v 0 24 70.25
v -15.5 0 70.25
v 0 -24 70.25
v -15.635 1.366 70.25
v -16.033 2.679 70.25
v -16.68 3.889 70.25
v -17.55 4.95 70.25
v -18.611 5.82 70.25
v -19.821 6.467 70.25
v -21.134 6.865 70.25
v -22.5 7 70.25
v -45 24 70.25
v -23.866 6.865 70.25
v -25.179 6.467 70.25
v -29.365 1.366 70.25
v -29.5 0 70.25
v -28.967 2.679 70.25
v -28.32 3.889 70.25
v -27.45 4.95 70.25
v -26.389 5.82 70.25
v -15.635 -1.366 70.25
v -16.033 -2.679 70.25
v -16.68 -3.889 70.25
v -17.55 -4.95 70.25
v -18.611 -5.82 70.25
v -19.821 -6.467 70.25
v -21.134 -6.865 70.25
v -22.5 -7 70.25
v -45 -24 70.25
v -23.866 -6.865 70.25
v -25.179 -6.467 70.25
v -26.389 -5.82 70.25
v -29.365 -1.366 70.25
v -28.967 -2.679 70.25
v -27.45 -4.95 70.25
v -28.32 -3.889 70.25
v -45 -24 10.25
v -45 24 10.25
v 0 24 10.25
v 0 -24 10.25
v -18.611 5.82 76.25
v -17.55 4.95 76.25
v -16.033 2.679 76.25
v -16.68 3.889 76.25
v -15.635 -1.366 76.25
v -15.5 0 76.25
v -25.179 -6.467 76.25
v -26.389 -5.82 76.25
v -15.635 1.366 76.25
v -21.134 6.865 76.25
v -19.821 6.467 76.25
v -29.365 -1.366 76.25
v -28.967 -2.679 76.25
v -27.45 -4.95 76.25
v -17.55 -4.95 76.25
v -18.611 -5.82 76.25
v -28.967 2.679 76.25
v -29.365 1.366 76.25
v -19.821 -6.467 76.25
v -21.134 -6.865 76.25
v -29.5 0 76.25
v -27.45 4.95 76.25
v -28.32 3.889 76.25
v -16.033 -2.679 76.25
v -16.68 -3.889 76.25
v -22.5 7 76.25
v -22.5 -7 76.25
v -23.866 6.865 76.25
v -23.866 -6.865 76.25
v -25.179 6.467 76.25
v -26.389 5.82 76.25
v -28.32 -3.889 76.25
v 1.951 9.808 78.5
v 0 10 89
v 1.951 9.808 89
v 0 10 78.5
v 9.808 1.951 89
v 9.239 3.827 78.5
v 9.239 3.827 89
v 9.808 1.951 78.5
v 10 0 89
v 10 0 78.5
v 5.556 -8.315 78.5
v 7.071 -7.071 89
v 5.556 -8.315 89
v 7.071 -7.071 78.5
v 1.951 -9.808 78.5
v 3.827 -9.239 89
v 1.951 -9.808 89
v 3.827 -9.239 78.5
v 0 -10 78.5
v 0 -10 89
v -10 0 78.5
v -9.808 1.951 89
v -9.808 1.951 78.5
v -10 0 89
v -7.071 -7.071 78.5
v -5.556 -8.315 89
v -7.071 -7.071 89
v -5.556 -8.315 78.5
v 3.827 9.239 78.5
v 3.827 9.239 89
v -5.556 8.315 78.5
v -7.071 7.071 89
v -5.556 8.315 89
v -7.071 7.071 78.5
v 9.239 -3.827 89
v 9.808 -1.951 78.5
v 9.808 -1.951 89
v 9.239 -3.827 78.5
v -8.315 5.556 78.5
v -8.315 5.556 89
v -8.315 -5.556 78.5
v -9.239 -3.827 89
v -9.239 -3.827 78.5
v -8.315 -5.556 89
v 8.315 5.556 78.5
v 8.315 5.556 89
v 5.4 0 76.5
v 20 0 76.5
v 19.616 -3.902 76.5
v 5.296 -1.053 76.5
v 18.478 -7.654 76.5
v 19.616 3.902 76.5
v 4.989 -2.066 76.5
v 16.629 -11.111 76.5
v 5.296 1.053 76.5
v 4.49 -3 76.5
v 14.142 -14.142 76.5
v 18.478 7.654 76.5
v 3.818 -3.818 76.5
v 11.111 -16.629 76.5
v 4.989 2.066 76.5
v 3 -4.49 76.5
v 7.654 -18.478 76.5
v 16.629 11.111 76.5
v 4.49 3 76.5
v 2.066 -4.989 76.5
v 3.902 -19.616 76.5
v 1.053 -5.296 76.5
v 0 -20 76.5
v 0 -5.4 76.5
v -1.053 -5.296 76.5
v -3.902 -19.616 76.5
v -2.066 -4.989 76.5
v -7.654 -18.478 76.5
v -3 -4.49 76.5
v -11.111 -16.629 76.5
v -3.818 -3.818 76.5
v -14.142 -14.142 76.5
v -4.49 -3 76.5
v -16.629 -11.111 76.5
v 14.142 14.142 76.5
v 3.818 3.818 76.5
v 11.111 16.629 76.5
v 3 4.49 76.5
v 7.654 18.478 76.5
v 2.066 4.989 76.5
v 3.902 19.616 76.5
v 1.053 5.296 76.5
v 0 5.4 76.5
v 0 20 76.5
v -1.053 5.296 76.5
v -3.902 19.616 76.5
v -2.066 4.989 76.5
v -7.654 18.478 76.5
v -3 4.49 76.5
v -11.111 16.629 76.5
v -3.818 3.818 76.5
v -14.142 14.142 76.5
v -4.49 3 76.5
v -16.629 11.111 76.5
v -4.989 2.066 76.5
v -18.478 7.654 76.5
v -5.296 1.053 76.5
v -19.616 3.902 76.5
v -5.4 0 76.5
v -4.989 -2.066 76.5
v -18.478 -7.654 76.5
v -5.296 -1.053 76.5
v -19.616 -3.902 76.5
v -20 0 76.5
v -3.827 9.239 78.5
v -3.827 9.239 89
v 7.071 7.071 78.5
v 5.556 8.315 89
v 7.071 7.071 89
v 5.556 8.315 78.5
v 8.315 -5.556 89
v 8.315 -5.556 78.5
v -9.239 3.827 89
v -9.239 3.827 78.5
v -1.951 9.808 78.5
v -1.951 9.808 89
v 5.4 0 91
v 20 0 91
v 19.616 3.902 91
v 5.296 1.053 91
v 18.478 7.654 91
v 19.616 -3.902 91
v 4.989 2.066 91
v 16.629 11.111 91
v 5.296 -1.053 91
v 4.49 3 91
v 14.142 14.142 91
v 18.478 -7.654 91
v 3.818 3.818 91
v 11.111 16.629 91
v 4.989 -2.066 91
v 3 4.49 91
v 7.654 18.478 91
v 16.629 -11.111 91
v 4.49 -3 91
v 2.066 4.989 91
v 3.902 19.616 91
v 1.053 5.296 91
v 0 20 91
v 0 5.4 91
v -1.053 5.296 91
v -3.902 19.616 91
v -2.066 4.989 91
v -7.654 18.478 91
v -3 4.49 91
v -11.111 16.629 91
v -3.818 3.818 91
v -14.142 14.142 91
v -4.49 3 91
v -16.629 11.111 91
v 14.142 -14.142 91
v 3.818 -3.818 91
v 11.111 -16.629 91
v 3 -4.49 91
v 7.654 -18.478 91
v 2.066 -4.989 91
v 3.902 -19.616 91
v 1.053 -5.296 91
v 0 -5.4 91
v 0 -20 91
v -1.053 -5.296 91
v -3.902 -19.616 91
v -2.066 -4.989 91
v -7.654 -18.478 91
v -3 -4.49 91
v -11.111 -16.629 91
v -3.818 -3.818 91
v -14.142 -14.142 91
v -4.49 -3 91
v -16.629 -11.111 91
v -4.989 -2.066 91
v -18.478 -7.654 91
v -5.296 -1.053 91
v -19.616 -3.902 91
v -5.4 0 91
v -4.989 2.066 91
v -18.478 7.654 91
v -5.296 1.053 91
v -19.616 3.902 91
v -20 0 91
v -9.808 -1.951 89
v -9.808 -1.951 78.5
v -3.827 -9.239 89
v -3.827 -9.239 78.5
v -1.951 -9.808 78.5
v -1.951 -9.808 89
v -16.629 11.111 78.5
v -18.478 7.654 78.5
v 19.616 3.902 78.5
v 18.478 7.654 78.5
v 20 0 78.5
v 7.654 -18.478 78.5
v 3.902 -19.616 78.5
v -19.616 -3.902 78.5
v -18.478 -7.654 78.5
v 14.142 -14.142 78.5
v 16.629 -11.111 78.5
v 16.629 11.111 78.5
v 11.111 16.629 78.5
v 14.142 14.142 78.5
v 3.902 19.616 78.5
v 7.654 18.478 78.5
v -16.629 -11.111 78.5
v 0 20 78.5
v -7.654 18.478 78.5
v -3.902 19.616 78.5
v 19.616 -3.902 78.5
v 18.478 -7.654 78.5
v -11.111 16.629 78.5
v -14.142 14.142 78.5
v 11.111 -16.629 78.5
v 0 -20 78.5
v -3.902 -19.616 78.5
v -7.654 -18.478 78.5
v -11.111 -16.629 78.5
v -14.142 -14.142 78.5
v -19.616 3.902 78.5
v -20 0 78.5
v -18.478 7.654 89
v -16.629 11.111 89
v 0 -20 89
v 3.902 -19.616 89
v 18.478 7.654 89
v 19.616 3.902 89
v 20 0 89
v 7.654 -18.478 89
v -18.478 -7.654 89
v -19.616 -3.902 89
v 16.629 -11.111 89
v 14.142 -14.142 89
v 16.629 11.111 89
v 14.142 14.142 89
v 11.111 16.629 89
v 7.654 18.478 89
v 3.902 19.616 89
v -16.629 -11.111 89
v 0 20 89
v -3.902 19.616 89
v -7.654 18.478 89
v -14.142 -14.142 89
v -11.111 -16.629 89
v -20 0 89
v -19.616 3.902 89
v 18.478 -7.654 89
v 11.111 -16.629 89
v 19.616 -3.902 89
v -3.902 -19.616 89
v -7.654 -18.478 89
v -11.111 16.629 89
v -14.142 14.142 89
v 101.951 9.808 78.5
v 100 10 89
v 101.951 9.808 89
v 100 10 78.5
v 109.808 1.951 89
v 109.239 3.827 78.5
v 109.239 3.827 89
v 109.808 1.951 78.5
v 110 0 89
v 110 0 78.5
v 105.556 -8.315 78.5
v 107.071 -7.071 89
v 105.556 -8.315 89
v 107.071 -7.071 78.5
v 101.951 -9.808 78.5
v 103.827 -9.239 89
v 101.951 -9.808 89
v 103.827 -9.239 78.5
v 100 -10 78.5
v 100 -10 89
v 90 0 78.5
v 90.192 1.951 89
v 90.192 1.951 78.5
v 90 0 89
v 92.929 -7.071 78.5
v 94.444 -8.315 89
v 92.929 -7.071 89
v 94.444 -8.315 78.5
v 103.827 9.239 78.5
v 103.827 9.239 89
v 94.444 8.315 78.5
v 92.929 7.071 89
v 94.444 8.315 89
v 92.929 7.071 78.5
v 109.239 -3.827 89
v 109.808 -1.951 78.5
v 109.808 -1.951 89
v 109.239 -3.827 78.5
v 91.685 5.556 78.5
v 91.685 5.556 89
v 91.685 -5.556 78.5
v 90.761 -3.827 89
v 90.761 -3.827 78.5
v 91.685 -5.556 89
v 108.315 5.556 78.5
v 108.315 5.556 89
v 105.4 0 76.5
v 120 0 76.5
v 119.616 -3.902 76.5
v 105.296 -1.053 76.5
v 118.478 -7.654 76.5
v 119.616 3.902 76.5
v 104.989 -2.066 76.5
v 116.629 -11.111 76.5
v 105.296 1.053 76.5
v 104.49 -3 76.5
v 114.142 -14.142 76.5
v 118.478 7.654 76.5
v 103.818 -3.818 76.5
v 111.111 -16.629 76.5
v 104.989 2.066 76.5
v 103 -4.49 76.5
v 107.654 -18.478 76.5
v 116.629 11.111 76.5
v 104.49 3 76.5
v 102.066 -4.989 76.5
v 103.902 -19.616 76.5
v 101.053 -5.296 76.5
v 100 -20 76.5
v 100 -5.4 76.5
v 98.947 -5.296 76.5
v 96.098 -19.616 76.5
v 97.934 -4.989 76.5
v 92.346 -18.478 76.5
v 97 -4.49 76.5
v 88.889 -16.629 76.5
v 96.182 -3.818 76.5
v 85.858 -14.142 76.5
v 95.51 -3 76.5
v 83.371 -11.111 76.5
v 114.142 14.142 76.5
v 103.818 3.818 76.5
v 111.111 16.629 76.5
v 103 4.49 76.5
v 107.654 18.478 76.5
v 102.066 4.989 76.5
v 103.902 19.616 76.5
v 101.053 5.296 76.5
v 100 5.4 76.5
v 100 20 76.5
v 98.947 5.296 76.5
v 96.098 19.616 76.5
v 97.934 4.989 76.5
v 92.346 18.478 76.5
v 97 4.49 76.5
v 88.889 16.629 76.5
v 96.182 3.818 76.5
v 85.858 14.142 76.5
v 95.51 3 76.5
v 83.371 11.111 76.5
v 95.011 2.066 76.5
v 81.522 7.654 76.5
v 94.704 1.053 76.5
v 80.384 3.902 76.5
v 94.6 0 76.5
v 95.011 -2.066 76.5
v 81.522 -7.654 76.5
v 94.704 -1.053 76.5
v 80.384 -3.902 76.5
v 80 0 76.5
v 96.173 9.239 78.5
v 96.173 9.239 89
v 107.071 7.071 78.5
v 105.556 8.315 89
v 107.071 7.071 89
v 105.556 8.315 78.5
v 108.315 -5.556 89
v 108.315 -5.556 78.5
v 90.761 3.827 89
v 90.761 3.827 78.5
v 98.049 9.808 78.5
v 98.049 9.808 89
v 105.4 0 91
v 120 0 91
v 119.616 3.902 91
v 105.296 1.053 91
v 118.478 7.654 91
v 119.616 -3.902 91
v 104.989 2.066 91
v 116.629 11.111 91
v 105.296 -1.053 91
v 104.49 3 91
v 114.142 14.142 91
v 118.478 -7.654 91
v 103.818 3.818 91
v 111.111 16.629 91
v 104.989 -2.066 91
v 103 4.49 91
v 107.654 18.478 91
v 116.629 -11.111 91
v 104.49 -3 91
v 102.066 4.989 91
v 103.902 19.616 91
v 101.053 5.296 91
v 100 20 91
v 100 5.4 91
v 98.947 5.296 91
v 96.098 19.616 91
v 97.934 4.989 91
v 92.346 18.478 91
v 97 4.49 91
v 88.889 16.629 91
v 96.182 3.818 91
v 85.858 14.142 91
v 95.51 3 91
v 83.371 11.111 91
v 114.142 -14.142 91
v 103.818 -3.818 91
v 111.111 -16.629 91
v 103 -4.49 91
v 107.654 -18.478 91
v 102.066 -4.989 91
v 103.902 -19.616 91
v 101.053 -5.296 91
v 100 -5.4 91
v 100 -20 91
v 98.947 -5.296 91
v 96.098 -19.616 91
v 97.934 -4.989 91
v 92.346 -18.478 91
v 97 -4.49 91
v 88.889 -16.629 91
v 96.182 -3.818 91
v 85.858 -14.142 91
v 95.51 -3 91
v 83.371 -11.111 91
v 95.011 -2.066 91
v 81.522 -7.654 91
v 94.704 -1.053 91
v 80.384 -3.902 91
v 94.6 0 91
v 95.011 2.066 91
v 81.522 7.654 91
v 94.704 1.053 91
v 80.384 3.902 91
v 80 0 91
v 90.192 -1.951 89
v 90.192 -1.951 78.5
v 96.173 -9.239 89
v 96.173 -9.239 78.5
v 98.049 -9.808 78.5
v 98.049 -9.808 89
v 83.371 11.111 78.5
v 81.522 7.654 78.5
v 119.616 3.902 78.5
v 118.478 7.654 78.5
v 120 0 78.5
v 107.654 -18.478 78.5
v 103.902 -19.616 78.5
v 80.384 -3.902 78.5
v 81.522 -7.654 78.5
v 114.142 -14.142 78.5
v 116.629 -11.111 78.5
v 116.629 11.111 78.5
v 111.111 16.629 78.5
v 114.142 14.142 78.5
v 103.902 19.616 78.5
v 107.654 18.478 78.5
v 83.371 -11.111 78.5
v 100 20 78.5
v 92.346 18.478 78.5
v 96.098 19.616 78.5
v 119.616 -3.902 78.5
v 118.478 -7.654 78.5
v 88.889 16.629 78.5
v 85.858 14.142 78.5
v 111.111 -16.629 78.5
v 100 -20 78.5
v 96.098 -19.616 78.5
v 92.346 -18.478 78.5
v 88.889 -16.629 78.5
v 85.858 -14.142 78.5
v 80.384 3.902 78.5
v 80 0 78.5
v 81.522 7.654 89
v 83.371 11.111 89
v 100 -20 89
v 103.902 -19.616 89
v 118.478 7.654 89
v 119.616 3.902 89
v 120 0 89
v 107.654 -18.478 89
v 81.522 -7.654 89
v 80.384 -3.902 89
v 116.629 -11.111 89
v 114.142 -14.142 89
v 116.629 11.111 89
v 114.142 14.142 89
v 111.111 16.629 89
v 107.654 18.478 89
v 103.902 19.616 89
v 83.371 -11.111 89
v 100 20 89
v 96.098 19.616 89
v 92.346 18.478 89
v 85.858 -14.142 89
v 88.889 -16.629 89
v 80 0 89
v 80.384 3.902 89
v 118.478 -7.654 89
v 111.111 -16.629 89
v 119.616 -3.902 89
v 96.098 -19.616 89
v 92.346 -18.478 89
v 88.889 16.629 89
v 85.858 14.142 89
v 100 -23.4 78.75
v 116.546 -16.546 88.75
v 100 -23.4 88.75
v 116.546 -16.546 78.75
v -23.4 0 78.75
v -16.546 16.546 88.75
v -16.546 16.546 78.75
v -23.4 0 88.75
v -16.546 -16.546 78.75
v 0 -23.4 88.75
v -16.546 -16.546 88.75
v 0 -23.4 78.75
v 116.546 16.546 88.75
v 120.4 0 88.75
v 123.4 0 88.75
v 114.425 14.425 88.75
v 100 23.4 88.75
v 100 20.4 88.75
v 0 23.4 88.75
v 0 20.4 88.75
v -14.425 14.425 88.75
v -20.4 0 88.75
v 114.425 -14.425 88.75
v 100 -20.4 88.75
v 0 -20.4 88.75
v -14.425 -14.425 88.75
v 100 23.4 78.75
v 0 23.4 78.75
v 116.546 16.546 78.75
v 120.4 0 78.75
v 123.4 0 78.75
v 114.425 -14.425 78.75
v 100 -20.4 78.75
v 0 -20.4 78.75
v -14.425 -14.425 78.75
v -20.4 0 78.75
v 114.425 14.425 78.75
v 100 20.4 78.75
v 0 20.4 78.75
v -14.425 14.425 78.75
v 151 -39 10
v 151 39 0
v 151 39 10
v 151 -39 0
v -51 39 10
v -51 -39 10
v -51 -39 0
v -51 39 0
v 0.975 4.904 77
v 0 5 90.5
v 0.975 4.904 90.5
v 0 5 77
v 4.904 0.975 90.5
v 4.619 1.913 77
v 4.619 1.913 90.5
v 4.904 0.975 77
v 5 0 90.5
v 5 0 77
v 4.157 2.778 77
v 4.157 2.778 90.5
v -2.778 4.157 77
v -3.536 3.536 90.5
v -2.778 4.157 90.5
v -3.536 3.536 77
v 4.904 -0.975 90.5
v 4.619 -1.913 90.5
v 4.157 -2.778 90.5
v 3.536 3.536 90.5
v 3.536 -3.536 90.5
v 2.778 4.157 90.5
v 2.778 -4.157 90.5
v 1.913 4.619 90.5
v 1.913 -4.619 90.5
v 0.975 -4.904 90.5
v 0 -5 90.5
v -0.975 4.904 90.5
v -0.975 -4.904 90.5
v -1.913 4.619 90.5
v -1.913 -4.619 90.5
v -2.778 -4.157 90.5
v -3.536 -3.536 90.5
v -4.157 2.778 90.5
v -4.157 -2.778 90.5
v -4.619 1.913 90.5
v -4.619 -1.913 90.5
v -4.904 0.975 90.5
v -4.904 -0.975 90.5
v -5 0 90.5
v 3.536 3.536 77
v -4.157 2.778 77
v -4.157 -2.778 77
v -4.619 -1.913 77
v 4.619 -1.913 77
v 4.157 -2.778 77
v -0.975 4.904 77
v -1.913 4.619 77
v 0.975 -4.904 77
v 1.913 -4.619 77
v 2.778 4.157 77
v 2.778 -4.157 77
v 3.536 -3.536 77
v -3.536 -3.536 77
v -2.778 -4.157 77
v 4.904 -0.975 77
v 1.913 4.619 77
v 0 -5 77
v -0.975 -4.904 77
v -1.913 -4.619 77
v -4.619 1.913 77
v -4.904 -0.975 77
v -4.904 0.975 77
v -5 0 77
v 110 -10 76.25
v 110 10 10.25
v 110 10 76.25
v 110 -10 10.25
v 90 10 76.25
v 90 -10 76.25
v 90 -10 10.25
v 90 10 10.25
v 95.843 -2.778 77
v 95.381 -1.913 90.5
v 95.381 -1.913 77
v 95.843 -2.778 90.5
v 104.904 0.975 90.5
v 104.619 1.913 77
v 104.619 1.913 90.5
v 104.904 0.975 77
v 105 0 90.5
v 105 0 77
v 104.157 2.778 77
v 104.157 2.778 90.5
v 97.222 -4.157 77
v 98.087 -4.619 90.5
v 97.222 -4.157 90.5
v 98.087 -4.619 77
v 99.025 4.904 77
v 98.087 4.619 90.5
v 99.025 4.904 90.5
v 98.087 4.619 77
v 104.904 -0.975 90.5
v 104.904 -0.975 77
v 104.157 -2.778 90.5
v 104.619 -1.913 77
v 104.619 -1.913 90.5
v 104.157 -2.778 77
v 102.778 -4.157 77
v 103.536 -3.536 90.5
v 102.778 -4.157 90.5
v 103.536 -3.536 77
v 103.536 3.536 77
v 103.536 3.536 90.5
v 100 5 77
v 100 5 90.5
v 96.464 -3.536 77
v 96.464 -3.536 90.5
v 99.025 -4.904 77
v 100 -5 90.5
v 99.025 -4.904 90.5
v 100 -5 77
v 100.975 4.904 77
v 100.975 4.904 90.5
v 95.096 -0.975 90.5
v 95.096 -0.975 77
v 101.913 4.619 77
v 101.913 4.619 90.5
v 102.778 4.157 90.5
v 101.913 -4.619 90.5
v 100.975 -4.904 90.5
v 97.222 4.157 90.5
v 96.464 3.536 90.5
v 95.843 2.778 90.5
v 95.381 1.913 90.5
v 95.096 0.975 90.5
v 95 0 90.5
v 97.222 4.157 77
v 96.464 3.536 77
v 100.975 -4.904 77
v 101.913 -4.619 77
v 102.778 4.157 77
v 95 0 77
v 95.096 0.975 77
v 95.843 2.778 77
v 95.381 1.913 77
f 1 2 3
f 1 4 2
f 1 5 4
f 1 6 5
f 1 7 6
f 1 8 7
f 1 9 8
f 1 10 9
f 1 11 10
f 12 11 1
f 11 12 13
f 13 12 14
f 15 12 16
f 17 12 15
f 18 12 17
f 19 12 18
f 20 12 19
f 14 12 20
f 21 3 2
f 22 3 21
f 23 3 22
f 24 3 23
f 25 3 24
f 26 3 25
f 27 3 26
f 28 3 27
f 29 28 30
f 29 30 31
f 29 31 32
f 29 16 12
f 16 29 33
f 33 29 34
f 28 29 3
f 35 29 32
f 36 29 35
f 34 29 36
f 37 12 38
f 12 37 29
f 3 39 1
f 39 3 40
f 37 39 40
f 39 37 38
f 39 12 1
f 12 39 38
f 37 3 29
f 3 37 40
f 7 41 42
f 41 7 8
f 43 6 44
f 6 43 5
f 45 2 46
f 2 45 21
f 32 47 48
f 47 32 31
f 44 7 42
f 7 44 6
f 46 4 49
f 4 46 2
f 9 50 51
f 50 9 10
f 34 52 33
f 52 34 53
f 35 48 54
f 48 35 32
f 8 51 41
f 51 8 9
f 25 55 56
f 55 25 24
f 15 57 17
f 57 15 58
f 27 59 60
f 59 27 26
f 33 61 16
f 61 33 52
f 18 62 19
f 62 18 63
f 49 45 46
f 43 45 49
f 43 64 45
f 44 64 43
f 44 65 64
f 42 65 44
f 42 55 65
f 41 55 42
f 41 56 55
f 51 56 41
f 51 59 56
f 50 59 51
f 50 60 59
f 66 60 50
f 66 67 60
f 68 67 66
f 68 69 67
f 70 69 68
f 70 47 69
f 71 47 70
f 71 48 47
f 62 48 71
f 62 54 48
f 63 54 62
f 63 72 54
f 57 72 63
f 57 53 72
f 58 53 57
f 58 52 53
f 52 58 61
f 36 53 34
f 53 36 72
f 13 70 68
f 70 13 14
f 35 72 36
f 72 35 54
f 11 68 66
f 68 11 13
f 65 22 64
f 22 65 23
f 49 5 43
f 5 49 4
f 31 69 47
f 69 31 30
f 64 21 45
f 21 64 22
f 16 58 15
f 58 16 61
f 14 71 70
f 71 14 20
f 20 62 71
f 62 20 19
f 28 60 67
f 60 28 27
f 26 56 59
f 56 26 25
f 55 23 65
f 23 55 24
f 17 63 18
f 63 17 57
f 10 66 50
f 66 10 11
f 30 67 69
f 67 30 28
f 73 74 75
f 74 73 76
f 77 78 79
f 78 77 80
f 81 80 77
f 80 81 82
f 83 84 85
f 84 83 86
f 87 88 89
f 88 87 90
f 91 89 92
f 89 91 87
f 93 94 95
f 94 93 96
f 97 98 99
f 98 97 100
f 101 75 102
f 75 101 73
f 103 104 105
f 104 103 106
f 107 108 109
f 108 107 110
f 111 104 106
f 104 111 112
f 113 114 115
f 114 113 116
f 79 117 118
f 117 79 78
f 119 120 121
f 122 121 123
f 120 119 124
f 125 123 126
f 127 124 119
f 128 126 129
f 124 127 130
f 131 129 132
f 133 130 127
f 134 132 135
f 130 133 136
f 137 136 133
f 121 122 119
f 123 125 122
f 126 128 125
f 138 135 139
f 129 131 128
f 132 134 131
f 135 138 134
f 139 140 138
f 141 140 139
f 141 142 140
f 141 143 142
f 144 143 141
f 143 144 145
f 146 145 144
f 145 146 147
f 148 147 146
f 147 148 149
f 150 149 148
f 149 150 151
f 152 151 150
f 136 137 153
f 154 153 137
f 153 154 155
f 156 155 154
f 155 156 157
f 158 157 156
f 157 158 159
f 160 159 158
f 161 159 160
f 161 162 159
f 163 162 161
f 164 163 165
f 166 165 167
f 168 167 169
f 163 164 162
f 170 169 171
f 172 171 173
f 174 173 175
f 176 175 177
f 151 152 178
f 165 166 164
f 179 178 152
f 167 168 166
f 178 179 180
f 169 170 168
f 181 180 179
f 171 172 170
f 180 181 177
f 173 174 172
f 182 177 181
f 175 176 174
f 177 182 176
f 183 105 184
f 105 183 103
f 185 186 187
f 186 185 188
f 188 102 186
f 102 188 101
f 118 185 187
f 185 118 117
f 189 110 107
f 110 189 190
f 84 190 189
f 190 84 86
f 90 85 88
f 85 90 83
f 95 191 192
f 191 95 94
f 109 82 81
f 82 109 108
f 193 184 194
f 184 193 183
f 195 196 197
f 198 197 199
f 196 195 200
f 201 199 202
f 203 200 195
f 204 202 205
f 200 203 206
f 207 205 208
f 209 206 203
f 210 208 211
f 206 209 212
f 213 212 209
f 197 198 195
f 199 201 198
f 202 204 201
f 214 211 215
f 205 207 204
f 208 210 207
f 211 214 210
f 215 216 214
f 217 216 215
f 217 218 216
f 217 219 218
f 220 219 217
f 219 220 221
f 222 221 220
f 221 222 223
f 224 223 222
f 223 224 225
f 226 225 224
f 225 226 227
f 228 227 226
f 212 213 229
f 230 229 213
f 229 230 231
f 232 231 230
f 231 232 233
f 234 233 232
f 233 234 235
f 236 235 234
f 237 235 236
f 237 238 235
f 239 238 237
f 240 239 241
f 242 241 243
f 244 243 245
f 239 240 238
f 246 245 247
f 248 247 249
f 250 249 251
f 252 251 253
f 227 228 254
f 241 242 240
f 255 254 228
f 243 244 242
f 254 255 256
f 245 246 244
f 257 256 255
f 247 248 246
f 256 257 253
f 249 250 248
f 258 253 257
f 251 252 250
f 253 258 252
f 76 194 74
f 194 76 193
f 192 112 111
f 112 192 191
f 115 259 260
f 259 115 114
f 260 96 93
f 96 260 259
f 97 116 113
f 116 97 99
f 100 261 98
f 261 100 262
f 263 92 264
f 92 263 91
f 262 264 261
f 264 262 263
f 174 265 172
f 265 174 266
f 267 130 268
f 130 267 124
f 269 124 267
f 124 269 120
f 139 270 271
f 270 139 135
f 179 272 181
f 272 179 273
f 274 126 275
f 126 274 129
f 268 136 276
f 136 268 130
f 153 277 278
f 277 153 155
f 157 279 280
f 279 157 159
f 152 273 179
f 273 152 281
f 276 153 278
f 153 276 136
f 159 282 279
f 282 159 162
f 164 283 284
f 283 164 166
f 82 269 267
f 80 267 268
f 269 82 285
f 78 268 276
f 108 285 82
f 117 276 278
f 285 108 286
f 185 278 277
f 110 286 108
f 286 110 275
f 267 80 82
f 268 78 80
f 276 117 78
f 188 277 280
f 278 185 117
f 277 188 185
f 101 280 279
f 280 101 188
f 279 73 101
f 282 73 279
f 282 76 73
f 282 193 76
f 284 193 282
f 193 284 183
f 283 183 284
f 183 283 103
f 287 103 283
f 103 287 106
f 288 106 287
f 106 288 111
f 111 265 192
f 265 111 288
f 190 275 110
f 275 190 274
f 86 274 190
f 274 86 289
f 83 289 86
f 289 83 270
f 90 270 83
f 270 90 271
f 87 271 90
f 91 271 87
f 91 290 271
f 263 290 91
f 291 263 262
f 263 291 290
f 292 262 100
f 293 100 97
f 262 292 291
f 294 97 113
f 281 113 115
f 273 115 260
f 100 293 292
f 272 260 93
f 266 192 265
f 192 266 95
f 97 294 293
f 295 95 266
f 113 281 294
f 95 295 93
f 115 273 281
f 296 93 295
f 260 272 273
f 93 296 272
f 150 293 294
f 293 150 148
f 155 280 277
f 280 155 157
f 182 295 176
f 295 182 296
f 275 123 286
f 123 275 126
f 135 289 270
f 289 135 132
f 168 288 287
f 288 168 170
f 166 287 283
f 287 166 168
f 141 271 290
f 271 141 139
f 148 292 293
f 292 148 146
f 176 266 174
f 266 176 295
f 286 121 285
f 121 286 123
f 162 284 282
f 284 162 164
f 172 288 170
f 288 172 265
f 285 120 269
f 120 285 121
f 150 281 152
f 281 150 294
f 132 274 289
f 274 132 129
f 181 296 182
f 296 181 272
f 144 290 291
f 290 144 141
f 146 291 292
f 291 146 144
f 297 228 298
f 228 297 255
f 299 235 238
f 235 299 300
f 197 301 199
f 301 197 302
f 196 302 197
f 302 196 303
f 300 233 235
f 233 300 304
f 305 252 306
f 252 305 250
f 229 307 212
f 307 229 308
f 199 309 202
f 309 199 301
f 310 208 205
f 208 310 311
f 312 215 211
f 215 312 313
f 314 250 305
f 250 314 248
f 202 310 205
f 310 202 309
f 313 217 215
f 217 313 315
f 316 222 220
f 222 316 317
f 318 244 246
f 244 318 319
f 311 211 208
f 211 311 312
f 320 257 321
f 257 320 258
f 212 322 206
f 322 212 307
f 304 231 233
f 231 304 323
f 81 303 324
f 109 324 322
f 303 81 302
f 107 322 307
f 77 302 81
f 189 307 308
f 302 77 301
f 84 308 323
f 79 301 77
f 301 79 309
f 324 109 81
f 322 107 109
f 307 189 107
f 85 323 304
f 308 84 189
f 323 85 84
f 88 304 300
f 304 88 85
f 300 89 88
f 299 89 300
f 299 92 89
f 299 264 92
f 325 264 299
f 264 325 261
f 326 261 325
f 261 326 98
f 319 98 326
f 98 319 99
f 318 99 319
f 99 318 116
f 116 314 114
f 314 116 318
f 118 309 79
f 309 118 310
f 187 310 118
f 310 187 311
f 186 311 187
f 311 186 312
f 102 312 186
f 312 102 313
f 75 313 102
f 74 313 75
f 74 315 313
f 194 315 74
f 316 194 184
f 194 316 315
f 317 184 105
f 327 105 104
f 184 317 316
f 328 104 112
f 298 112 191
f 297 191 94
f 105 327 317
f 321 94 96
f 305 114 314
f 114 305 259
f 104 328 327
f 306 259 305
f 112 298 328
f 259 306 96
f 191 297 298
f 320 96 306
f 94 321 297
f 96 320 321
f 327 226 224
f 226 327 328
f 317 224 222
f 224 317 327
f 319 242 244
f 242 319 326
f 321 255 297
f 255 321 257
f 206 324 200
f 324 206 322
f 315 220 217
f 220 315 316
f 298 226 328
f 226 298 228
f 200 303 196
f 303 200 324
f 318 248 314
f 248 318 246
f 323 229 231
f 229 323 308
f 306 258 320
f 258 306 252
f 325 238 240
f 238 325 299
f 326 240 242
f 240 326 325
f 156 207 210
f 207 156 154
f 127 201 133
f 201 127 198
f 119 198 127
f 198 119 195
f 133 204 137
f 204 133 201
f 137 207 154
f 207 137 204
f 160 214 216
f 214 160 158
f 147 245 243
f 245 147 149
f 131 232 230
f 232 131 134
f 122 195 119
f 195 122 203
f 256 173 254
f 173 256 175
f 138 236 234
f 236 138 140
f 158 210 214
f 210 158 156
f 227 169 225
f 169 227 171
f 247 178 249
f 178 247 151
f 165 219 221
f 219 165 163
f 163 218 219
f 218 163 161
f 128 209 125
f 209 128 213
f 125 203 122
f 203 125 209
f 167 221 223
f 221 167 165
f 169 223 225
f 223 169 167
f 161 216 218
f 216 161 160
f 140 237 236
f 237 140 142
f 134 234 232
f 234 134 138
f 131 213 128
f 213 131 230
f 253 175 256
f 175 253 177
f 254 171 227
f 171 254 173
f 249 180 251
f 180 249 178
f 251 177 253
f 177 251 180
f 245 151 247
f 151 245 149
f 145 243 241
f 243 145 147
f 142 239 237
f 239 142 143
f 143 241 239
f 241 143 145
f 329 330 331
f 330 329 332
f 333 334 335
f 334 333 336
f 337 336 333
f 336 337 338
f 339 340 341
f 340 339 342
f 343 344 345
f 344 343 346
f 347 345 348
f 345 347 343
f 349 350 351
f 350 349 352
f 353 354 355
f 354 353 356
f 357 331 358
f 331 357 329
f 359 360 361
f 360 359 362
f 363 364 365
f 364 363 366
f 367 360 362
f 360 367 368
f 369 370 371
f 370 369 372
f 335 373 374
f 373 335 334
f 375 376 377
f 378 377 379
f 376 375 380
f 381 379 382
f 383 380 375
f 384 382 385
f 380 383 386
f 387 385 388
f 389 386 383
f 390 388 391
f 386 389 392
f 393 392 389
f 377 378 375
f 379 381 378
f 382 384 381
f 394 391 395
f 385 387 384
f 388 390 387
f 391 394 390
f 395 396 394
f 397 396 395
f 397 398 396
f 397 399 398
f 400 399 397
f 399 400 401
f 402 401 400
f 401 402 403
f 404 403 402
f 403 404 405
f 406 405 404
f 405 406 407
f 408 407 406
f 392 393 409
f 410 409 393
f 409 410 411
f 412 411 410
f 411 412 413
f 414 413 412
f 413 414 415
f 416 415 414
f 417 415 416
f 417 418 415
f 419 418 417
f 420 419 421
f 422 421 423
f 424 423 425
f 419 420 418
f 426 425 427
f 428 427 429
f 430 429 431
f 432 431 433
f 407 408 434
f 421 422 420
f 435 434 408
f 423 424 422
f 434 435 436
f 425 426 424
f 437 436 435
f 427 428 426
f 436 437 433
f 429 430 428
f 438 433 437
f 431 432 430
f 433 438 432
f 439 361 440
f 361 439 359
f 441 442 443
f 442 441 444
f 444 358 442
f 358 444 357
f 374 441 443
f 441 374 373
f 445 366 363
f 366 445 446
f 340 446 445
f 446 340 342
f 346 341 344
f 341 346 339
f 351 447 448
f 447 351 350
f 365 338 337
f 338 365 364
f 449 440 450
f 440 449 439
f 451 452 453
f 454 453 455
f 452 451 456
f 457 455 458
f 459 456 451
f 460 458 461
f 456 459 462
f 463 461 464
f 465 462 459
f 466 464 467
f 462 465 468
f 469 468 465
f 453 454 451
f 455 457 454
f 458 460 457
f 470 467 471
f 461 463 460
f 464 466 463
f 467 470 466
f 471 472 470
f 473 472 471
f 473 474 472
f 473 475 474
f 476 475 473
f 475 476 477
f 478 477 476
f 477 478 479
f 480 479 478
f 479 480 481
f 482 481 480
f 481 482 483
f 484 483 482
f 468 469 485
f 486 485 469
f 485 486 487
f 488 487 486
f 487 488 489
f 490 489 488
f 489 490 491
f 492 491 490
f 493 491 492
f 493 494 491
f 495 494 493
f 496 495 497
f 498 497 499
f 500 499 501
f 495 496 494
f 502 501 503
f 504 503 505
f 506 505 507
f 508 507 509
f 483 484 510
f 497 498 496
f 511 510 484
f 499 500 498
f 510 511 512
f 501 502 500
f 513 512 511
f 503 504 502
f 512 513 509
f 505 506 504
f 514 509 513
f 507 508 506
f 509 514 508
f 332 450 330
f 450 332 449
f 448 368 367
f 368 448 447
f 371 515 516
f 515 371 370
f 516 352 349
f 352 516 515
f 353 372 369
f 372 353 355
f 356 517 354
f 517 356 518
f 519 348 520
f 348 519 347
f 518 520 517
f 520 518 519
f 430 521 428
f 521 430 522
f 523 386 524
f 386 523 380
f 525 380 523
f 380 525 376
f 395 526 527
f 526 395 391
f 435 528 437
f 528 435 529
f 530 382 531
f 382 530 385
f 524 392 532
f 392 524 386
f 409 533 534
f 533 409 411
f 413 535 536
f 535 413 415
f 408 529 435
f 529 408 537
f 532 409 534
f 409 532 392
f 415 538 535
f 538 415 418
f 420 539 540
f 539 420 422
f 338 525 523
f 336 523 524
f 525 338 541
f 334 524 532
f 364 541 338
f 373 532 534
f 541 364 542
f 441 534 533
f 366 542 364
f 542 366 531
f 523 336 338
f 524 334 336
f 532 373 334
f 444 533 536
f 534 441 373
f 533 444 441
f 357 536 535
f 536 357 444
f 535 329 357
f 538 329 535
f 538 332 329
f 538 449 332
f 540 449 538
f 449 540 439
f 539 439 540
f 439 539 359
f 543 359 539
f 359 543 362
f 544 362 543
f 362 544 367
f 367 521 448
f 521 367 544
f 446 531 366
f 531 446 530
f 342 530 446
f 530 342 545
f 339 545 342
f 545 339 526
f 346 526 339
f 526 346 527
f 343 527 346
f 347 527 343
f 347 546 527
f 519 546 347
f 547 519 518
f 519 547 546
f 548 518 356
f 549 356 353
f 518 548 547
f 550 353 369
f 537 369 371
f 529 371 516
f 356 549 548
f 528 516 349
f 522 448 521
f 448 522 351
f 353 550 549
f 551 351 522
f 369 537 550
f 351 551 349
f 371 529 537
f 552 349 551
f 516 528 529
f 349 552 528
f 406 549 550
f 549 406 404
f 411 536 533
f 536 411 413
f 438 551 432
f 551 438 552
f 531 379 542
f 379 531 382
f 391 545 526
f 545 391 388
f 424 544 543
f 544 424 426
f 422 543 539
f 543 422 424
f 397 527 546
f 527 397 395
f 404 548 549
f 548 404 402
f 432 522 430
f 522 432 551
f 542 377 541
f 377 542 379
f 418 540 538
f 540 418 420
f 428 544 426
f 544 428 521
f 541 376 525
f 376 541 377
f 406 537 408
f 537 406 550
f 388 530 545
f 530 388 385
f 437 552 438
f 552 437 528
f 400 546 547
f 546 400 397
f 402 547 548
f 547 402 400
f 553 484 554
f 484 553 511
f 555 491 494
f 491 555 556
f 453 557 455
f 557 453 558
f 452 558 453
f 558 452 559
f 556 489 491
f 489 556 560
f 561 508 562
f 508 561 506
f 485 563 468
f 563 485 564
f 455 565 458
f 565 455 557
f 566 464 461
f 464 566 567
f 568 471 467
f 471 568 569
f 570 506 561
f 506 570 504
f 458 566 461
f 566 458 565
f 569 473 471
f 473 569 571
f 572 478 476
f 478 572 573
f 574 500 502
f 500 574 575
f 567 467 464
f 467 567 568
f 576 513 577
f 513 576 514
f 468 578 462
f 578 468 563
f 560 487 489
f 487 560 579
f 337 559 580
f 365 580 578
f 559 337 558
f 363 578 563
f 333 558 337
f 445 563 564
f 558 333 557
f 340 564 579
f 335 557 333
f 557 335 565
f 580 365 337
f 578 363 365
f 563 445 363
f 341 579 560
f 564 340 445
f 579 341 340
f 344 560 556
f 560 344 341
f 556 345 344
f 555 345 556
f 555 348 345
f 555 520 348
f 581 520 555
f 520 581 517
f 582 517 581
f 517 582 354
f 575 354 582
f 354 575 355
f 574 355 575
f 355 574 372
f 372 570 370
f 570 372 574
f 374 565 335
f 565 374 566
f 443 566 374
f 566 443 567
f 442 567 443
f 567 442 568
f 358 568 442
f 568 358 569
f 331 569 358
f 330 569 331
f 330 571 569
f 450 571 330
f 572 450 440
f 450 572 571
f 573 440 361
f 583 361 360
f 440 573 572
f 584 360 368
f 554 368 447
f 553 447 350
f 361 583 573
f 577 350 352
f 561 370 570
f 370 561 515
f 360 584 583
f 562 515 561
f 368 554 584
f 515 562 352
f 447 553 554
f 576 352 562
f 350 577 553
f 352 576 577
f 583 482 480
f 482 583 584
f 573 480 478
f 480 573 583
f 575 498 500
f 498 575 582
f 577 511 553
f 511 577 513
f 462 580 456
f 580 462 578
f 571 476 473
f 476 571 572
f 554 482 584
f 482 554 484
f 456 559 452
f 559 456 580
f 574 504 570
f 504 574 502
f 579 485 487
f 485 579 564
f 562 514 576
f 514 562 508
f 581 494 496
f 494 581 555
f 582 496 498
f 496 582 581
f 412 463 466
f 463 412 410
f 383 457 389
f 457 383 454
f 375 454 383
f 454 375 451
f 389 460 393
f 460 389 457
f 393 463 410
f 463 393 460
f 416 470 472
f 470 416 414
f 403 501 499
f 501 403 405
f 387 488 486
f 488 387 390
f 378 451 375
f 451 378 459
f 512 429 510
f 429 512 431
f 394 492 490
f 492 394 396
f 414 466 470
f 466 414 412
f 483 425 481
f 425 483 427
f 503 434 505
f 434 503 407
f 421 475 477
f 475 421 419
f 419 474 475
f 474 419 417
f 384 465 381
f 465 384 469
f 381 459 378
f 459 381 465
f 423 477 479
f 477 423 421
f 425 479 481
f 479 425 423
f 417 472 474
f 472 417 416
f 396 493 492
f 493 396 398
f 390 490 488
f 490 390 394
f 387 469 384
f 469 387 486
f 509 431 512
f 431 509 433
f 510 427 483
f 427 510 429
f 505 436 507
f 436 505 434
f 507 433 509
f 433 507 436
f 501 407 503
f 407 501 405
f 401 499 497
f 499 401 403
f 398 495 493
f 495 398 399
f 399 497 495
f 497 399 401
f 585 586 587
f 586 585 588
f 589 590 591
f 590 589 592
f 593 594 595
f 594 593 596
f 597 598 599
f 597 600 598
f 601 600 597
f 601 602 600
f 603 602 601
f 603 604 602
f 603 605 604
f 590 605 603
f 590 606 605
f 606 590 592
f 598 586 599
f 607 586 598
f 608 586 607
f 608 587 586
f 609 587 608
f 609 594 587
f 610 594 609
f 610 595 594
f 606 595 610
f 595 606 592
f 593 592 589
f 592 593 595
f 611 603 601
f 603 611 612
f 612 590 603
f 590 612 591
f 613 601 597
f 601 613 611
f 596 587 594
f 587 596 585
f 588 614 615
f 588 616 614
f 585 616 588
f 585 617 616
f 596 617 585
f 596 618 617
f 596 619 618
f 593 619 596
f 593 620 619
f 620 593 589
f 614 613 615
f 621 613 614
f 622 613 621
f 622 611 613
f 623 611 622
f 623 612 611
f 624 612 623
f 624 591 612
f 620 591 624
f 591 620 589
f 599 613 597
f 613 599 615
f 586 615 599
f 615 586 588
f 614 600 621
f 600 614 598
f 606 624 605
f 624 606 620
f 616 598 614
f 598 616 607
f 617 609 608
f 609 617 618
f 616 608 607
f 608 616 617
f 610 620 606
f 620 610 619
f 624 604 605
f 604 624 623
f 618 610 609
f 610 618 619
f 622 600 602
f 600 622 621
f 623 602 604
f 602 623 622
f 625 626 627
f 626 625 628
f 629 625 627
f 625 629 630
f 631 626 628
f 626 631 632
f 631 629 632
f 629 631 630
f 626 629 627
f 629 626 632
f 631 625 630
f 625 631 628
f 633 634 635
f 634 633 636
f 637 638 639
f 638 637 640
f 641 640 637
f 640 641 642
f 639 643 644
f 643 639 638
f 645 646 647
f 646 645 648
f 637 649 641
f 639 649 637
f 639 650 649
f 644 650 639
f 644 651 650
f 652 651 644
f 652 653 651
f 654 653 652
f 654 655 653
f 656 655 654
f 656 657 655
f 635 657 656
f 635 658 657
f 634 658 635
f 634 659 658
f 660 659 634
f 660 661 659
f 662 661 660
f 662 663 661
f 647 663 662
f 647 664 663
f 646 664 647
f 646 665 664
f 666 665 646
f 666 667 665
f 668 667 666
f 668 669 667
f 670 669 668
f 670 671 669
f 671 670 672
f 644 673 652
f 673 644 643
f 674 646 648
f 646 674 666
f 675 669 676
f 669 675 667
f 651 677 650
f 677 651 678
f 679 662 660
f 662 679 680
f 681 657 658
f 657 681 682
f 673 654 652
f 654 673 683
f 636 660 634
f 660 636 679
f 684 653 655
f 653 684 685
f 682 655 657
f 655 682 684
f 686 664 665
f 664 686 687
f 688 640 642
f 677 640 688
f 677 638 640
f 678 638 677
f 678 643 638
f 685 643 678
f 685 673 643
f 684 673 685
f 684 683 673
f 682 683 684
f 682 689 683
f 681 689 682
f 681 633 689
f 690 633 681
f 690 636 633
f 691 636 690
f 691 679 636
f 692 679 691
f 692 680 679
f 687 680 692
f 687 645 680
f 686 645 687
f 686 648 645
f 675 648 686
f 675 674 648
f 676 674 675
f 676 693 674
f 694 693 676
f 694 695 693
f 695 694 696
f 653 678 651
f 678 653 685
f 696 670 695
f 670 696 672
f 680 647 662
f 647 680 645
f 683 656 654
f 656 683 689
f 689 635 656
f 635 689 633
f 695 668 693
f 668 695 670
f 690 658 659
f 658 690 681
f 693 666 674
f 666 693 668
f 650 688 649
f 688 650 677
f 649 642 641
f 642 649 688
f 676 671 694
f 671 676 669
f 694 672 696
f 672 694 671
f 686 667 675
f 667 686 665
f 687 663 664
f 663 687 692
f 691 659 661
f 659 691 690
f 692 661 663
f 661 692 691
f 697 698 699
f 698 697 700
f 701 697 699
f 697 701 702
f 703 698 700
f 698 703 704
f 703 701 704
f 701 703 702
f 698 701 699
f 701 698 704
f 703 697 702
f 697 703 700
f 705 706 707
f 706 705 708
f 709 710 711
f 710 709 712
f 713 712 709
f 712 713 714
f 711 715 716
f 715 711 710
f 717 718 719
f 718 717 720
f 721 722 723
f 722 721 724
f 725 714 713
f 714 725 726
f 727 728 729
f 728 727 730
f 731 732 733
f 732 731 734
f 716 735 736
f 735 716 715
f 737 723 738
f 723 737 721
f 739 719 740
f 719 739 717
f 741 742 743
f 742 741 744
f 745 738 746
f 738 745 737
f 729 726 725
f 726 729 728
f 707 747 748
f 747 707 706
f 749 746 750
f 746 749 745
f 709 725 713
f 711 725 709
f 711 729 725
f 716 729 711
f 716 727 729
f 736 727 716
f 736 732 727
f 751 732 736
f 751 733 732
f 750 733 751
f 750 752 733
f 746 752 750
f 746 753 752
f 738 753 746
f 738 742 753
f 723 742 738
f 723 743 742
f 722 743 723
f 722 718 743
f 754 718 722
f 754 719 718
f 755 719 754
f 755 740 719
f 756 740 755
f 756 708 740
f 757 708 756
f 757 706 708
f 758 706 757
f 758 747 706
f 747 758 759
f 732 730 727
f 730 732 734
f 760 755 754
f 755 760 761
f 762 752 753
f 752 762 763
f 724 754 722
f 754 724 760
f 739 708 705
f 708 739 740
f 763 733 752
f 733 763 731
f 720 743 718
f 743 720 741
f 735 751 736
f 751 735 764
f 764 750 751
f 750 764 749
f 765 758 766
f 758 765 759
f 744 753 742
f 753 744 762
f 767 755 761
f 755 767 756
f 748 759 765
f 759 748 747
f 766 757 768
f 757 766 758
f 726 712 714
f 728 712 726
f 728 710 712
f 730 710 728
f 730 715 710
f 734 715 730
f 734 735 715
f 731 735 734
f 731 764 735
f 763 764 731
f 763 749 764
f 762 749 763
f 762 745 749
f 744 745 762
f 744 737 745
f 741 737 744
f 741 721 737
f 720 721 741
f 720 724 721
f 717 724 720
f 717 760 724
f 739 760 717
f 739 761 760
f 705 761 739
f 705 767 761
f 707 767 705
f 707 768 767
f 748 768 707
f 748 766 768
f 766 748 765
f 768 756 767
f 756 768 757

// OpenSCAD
$fn = 32;

// ------------------------------------------------------------------------
// Motor belt drive: span 100 mm, pulleys d40, belt 10 mm wide
// Every part is its own module, assembly() places every instance.
// ------------------------------------------------------------------------

// --- part 1 ---
module base_plate() {
  difference() {
    translate([-101, -39, 0]) cube([202, 78, 10]);
  }
}

// --- part 2 ---
module motor() {
  union() {
    translate([-30, -24, 0]) cube([60, 48, 45]);
    translate([33, 0, 22.5]) rotate([0, 90, 0]) cylinder(h = 6, d = 14, center = true);
  }
}

// --- part 3 ---
module drive_shaft() {
  translate([0, 0, -6.75]) cylinder(h = 13.5, d = 10);
}

// --- part 4 ---
module pulley_drive() {
  difference() {
    union() {
      cylinder(h = 14.5, d = 20);
      cylinder(h = 2, d = 40);
      translate([0, 0, 12.5]) cylinder(h = 2, d = 40);
    }
    translate([0, 0, -1]) cylinder(h = 16.5, d = 10.8);
  }
}

// --- part 5 ---
module idler_post() {
  translate([-10, -10, 0]) cube([20, 20, 66]);
}

// --- part 6 ---
module driven_shaft() {
  translate([0, 0, -6.75]) cylinder(h = 13.5, d = 10);
}

// --- part 7 ---
module pulley_driven() {
  difference() {
    union() {
      cylinder(h = 14.5, d = 20);
      cylinder(h = 2, d = 40);
      translate([0, 0, 12.5]) cylinder(h = 2, d = 40);
    }
    translate([0, 0, -1]) cylinder(h = 16.5, d = 10.8);
  }
}

// --- part 8 ---
module drive_belt() {
  difference() {
    linear_extrude(height = 10) polygon(points = concat([for (a = [90 : 45 : 270]) [23.4 * cos(a), 23.4 * sin(a)]], [for (a = [270 : 45 : 450]) [100 + 23.4 * cos(a), 23.4 * sin(a)]]));
    translate([0, 0, -1]) linear_extrude(height = 12) polygon(points = concat([for (a = [90 : 45 : 270]) [20.4 * cos(a), 20.4 * sin(a)]], [for (a = [270 : 45 : 450]) [100 + 20.4 * cos(a), 20.4 * sin(a)]]));
  }
}

// --- assembly ---
module assembly() {
  color([0.80, 0.24, 0.20]) translate([50, 0, 0]) rotate([0, 0, 0]) base_plate();
  color([0.20, 0.45, 0.75]) translate([0, 0, 40.25]) rotate([0, 270, 0]) motor();
  color([0.25, 0.62, 0.32]) translate([0, 0, 83.75]) rotate([0, 0, 0]) drive_shaft();
  color([0.92, 0.70, 0.18]) translate([0, 0, 76.5]) rotate([0, 0, 0]) pulley_drive();
  color([0.58, 0.35, 0.70]) translate([100, 0, 10.25]) rotate([0, 0, 0]) idler_post();
  color([0.16, 0.66, 0.66]) translate([100, 0, 83.75]) rotate([0, 0, 0]) driven_shaft();
  color([0.85, 0.48, 0.18]) translate([100, 0, 76.5]) rotate([0, 0, 0]) pulley_driven();
  color([0.55, 0.60, 0.65]) translate([0, 0, 78.75]) rotate([0, 0, 0]) drive_belt();
}

assembly();
